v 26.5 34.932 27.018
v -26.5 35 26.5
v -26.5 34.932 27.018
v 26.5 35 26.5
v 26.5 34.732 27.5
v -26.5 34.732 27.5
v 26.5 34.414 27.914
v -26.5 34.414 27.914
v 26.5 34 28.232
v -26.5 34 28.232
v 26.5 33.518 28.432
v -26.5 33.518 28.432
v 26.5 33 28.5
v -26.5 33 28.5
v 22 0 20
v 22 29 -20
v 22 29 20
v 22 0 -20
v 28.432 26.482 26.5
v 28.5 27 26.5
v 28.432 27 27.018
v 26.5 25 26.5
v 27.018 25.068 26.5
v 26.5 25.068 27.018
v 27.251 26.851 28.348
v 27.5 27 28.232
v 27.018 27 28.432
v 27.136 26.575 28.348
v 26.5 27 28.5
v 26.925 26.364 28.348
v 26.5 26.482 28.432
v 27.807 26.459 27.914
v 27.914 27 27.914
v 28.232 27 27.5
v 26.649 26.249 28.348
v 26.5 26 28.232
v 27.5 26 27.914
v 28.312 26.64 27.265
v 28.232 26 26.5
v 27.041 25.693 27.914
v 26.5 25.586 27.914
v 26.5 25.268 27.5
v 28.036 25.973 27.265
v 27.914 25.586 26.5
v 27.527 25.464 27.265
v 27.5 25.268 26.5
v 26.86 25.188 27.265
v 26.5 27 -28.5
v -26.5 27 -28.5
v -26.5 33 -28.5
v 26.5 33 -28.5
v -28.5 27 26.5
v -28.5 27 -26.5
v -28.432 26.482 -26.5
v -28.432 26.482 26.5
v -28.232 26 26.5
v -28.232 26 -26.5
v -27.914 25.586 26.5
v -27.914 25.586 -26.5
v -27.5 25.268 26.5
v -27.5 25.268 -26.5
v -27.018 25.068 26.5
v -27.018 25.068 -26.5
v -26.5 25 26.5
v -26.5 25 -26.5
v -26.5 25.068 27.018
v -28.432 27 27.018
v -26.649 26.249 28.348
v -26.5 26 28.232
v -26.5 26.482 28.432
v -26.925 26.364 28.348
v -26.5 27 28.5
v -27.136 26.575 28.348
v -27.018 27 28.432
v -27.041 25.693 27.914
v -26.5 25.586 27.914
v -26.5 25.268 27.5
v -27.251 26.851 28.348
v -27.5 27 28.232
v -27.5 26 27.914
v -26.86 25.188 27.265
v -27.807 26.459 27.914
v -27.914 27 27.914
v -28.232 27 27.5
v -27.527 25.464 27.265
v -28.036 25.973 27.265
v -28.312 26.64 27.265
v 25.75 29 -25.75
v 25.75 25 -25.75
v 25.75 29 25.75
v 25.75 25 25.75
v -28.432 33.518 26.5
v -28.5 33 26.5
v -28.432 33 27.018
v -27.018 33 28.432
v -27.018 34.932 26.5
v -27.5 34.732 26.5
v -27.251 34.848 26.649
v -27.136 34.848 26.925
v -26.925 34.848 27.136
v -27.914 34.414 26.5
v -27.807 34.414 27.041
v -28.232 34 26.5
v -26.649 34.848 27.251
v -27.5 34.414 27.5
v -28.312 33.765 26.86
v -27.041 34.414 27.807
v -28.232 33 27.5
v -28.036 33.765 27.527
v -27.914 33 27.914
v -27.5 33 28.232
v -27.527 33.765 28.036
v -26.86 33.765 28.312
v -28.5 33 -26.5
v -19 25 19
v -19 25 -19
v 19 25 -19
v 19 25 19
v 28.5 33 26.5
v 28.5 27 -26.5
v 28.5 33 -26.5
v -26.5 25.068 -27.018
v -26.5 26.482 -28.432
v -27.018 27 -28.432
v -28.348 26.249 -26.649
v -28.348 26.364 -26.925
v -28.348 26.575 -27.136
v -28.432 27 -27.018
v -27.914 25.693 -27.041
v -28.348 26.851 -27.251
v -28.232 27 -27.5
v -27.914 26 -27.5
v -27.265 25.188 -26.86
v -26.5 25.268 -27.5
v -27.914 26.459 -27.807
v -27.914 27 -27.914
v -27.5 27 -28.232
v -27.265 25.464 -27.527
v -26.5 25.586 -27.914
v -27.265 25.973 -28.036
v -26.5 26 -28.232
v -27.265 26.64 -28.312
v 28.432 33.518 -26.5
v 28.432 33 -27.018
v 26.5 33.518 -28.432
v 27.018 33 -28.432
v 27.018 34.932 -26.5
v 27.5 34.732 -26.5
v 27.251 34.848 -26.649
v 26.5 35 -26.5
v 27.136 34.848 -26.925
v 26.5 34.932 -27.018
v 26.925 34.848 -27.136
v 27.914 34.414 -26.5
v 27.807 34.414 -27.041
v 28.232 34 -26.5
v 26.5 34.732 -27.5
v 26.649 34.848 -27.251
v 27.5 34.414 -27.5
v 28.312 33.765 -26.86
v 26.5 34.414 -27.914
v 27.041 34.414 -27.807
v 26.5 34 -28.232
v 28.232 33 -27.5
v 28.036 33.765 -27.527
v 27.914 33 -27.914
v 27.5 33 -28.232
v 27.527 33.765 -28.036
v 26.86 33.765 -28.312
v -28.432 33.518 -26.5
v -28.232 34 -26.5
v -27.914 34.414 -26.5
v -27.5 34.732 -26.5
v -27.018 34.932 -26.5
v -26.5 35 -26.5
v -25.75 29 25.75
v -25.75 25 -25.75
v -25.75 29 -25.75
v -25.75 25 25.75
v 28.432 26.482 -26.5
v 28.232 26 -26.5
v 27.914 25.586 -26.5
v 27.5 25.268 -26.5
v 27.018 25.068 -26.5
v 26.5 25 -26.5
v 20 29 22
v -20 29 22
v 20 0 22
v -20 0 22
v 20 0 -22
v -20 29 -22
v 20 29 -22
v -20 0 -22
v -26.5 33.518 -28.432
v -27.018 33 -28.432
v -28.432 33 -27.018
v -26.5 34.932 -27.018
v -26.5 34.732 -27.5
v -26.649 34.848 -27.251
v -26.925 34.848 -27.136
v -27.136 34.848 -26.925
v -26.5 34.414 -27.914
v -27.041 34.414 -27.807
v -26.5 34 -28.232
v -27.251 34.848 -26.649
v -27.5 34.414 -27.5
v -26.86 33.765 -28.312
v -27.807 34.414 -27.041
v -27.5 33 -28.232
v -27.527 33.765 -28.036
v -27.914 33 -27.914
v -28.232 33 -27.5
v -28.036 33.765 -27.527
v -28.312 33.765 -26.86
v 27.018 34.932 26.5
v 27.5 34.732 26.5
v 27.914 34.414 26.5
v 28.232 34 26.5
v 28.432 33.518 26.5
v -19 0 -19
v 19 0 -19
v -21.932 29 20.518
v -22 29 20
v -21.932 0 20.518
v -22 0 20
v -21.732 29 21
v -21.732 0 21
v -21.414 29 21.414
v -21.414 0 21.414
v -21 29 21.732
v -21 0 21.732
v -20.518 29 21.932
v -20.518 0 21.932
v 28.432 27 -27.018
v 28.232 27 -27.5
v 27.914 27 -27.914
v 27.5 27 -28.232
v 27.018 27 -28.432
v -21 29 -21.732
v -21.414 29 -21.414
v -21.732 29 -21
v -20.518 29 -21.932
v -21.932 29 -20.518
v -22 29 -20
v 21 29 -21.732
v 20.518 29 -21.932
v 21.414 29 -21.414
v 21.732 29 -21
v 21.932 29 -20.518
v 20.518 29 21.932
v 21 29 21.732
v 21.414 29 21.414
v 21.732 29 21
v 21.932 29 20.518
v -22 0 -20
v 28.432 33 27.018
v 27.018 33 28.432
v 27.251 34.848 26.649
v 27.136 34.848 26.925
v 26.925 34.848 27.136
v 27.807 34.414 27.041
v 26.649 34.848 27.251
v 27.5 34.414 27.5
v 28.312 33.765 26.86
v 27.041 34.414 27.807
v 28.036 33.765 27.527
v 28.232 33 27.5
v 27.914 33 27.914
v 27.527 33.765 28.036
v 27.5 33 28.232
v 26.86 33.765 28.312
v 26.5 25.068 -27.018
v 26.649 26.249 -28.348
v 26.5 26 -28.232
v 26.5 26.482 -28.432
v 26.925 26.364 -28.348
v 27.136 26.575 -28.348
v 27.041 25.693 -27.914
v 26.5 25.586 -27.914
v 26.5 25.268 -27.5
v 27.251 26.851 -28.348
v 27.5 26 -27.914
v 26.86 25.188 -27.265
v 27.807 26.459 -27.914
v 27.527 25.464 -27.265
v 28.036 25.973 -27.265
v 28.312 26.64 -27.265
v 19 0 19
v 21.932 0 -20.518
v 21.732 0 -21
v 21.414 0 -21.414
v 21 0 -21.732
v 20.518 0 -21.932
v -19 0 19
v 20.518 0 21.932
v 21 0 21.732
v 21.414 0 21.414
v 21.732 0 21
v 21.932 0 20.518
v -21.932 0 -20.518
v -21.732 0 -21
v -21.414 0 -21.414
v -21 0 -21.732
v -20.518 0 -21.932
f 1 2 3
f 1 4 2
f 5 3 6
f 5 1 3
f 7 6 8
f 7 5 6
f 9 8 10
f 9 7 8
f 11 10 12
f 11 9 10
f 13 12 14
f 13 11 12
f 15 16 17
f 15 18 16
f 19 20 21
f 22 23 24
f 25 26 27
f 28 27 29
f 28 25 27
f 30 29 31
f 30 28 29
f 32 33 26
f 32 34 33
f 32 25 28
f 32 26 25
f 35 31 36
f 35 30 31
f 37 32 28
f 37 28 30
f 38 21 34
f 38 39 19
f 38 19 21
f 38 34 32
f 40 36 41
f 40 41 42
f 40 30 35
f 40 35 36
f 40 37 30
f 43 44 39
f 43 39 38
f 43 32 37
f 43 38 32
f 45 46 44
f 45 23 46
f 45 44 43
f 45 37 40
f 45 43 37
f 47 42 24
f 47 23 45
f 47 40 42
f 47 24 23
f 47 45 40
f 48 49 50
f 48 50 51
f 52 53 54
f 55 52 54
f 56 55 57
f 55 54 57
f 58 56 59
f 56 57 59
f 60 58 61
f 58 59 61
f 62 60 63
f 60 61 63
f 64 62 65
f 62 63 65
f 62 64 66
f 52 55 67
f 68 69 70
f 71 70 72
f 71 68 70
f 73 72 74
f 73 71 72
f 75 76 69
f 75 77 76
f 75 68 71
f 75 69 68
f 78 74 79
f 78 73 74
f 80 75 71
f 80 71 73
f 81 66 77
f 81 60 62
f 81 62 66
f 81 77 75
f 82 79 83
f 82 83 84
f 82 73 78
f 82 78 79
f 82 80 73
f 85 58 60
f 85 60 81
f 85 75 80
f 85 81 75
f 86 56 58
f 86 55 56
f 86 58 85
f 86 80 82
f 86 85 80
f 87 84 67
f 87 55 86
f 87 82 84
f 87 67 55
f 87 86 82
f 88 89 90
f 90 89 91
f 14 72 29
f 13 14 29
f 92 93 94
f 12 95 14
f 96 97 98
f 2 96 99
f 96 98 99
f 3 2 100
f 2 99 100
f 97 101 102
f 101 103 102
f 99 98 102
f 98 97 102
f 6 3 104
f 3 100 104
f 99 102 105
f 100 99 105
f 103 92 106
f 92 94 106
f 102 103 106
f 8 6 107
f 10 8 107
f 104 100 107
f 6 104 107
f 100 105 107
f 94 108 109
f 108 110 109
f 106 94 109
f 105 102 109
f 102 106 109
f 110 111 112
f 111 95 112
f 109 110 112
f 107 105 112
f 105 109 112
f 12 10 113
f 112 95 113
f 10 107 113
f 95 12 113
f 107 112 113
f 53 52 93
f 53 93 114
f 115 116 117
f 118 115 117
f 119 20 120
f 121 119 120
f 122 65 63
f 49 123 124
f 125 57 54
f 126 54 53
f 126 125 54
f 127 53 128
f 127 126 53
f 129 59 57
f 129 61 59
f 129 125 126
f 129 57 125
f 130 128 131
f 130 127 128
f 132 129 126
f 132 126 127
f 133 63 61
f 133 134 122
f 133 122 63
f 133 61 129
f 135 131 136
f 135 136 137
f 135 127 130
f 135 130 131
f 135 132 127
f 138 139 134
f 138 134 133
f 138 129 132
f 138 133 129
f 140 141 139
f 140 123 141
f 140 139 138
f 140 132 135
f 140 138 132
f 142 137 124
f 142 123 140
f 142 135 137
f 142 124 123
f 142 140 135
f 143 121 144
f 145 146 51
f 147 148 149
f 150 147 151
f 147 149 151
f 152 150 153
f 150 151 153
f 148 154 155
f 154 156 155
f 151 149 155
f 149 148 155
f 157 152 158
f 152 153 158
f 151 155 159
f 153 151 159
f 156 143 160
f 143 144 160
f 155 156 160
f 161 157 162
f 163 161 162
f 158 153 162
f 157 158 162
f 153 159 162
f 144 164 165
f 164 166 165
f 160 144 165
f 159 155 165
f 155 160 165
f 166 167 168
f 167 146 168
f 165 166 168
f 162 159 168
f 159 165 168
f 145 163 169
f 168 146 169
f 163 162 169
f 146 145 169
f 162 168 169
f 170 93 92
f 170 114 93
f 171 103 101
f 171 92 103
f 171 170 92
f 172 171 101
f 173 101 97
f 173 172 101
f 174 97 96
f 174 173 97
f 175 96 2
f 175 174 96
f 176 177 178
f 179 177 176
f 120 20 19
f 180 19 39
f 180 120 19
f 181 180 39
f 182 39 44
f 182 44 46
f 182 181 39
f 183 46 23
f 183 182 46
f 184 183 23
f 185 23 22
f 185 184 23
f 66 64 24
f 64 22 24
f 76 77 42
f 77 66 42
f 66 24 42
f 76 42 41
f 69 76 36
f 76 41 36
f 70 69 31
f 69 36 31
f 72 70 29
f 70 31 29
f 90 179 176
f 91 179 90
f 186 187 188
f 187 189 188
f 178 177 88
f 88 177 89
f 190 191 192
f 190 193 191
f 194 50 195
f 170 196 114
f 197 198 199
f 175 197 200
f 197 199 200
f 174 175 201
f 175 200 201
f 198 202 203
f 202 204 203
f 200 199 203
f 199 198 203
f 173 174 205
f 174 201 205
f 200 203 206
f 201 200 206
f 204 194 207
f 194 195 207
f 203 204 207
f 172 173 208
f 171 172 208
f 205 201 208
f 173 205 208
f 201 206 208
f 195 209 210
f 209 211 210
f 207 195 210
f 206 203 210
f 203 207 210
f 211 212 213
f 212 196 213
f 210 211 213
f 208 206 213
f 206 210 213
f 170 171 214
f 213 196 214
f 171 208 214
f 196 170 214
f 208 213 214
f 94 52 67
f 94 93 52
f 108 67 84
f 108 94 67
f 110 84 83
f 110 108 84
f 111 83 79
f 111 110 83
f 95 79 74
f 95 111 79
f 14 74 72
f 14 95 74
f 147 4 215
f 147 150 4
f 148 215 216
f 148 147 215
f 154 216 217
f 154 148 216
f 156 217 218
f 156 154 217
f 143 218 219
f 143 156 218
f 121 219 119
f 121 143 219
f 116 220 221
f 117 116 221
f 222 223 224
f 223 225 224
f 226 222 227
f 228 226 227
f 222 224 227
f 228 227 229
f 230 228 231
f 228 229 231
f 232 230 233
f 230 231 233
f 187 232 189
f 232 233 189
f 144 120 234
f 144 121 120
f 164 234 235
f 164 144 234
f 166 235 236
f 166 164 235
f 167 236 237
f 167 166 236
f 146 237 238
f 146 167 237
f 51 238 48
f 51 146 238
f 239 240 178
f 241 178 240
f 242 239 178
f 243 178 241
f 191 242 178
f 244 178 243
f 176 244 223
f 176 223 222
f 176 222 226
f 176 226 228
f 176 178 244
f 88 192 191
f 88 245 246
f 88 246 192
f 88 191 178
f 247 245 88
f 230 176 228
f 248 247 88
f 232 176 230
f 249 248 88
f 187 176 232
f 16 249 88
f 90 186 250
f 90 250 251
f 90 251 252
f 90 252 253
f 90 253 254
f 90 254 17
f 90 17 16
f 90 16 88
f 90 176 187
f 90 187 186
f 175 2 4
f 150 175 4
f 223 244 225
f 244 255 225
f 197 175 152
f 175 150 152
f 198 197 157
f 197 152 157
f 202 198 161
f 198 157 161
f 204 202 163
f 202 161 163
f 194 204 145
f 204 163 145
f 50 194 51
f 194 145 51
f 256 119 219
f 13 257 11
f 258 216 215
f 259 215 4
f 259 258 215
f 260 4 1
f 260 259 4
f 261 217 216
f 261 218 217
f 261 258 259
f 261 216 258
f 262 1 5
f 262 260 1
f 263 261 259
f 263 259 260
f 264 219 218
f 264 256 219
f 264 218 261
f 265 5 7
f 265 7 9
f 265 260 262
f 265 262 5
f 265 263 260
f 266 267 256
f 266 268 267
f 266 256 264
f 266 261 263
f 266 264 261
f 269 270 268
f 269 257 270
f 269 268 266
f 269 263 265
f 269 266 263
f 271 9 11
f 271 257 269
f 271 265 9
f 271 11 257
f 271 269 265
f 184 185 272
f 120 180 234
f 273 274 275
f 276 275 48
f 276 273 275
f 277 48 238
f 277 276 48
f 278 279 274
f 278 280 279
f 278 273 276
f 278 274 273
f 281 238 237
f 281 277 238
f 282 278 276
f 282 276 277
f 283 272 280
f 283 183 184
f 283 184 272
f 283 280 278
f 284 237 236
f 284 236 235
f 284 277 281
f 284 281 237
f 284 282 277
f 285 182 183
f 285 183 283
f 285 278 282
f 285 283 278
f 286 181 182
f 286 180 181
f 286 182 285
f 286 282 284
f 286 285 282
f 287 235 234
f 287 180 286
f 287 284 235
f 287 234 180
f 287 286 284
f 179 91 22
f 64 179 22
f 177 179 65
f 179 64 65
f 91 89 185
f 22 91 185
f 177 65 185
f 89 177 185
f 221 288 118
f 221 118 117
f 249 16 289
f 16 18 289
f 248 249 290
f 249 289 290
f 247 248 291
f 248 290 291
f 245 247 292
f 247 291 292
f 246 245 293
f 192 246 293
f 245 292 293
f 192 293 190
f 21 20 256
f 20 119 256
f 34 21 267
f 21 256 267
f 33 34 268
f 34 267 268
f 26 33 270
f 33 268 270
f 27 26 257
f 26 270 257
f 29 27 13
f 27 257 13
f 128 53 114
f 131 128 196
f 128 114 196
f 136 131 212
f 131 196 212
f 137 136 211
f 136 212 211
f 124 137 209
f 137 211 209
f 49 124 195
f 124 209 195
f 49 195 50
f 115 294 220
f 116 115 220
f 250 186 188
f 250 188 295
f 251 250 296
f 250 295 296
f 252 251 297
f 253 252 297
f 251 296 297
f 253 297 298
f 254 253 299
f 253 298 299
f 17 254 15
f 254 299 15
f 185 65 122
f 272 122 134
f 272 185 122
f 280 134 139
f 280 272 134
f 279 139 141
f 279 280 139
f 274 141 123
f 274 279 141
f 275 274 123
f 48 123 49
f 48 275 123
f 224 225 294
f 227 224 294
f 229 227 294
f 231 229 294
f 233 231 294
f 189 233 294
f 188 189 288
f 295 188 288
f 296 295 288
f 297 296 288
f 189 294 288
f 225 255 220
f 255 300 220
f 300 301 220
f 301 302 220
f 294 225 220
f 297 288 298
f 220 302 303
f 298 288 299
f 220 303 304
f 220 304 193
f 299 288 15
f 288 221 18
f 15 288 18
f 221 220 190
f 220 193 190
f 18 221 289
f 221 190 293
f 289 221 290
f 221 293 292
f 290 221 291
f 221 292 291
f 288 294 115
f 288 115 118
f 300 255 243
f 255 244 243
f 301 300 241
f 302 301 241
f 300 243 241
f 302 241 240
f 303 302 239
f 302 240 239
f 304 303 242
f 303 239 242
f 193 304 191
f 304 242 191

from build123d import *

# Parameters (mm, degrees)
SKETCH1_W           = 44
SKETCH1_H           = 44
SKETCH1_W_2         = 38
SKETCH1_H_2         = 38
BOSS_EXTRUDE1_DEPTH = 25
SKETCH2_W           = 57
SKETCH2_H           = 57
BOSS_EXTRUDE2_DEPTH = 10
SKETCH3_W           = 51.5
SKETCH3_H           = 51.5
SKETCH3_W_2         = 44
SKETCH3_H_2         = 44
CUT_EXTRUDE1_DEPTH  = 4
FILLET1_R           = 2


with BuildPart() as part:
    # Sketch1 → Boss-Extrude1 (new body)
    with BuildSketch(Plane(origin=(0, 0, 0), x_dir=(1, 0, 0), z_dir=(0, 1, 0))):
        Rectangle(SKETCH1_W, SKETCH1_H)
        Rectangle(SKETCH1_W_2, SKETCH1_H_2, mode=Mode.SUBTRACT)
    extrude(amount=BOSS_EXTRUDE1_DEPTH)

    # Sketch2 → Boss-Extrude2 (add)
    with BuildSketch(Plane(origin=(0, 25, 0), x_dir=(1, 0, 0), z_dir=(0, 1, 0))):
        Rectangle(SKETCH2_W, SKETCH2_H)
    extrude(amount=BOSS_EXTRUDE2_DEPTH)

    # Sketch3 → Cut-Extrude1 (cut)
    with BuildSketch(Plane.XZ.offset(-25)):
        Rectangle(SKETCH3_W, SKETCH3_H)
        Rectangle(SKETCH3_W_2, SKETCH3_H_2, mode=Mode.SUBTRACT)
    extrude(amount=-CUT_EXTRUDE1_DEPTH, mode=Mode.SUBTRACT)

    # Fillet1
    fillet1_edges = [part.edges().sort_by_distance(p)[0] for p in [
        (28.5, 25, 0),
        (28.5, 30, 28.5),
        (0, 25, -28.5),
        (28.5, 30, -28.5),
        (-28.5, 25, 0),
        (-28.5, 30, -28.5),
        (0, 25, 28.5),
        (-28.5, 30, 28.5),
        (28.5, 35, 0),
        (0, 35, -28.5),
        (-28.5, 35, 0),
        (0, 35, 28.5),
        (22, 14.5, 22),
        (-22, 14.5, 22),
        (-22, 14.5, -22),
        (22, 14.5, -22),
    ]]
    fillet(fillet1_edges, radius=FILLET1_R)


solid = part.part
